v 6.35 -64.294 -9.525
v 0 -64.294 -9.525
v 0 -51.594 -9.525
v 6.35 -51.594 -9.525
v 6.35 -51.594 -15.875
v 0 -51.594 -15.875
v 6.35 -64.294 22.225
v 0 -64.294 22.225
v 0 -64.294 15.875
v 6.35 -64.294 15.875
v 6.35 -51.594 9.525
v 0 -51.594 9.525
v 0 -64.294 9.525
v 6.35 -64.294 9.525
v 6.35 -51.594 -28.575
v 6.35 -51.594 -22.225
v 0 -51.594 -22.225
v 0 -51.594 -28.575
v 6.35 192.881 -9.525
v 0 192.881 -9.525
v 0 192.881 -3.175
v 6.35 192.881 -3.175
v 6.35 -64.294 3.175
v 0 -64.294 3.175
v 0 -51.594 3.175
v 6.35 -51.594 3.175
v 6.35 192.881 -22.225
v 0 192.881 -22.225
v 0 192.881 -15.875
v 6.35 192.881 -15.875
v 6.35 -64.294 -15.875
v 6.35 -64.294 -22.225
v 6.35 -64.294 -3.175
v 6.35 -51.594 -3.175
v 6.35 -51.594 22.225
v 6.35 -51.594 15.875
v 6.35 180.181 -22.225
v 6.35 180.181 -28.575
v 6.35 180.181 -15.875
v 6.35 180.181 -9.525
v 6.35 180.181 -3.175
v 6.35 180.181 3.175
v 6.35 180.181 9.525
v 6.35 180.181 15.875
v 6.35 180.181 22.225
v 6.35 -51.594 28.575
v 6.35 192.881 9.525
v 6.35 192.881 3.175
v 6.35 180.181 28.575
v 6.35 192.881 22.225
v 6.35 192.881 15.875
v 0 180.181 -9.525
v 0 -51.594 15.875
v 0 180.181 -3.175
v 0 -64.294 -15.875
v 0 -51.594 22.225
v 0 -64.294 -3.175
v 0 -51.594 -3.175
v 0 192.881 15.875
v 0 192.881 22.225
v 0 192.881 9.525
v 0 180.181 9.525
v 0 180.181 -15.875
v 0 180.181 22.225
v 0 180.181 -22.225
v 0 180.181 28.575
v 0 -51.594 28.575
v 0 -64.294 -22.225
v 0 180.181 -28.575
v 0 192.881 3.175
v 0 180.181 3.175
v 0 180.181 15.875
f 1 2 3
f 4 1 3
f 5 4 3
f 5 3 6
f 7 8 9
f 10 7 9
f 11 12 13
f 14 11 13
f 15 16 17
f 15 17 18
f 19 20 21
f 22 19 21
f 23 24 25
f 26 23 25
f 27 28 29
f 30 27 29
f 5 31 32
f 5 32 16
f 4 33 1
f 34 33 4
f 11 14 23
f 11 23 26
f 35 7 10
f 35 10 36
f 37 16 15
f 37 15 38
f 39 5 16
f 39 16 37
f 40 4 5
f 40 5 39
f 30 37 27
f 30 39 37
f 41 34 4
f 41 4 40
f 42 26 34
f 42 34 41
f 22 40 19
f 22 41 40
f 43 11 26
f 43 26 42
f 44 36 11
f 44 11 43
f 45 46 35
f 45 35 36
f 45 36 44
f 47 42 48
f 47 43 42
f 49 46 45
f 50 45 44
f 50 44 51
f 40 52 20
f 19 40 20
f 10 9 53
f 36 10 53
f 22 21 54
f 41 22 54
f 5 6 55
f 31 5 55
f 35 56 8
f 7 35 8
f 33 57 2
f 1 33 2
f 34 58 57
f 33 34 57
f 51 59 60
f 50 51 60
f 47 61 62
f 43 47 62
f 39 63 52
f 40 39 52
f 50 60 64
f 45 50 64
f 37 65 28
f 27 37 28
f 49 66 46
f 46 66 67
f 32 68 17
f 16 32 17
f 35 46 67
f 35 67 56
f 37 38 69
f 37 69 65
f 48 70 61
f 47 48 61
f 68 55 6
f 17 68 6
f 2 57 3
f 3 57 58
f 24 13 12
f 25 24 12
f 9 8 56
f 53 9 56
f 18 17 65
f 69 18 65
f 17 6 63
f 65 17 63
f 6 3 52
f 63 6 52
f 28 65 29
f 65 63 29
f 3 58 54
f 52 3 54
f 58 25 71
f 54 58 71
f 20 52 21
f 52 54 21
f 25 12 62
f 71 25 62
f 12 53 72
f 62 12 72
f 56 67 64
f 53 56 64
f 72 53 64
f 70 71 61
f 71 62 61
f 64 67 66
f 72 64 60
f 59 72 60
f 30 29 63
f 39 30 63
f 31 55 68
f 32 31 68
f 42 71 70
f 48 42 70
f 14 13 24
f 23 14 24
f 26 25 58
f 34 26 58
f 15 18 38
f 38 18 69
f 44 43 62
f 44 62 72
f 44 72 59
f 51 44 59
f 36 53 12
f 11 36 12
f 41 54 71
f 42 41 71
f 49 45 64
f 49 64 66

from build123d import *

# Parameters (mm, degrees)
F1_DEPTH = 6.35


with BuildPart() as f1:
    # F0 (on Right) → F1 (new body)
    with BuildSketch(Plane.YZ):
        Polygon((64.29375, 28.575), (-51.59375, 28.575), (-51.59375, 22.225), (-64.29375, 22.225), (-64.29375, 15.875), (-51.59375, 15.875), (-51.59375, 9.525), (-64.29375, 9.525), (-64.29375, 3.175), (-51.59375, 3.175), (-51.59375, -3.175), (-64.29375, -3.175), (-64.29375, -9.525), (-51.59375, -9.525), (-51.59375, -15.875), (-64.29375, -15.875), (-64.29375, -22.225), (-51.59375, -22.225), (-51.59375, -28.575), (64.29375, -28.575), align=None)
        Polygon((180.18125, 28.575), (64.29375, 28.575), (64.29375, -28.575), (180.18125, -28.575), (180.18125, -22.225), (192.88125, -22.225), (192.88125, -15.875), (180.18125, -15.875), (180.18125, -9.525), (192.88125, -9.525), (192.88125, -3.175), (180.18125, -3.175), (180.18125, 3.175), (192.88125, 3.175), (192.88125, 9.525), (180.18125, 9.525), (180.18125, 15.875), (192.88125, 15.875), (192.88125, 22.225), (180.18125, 22.225), align=None)
    extrude(amount=F1_DEPTH)


solid = f1.part
